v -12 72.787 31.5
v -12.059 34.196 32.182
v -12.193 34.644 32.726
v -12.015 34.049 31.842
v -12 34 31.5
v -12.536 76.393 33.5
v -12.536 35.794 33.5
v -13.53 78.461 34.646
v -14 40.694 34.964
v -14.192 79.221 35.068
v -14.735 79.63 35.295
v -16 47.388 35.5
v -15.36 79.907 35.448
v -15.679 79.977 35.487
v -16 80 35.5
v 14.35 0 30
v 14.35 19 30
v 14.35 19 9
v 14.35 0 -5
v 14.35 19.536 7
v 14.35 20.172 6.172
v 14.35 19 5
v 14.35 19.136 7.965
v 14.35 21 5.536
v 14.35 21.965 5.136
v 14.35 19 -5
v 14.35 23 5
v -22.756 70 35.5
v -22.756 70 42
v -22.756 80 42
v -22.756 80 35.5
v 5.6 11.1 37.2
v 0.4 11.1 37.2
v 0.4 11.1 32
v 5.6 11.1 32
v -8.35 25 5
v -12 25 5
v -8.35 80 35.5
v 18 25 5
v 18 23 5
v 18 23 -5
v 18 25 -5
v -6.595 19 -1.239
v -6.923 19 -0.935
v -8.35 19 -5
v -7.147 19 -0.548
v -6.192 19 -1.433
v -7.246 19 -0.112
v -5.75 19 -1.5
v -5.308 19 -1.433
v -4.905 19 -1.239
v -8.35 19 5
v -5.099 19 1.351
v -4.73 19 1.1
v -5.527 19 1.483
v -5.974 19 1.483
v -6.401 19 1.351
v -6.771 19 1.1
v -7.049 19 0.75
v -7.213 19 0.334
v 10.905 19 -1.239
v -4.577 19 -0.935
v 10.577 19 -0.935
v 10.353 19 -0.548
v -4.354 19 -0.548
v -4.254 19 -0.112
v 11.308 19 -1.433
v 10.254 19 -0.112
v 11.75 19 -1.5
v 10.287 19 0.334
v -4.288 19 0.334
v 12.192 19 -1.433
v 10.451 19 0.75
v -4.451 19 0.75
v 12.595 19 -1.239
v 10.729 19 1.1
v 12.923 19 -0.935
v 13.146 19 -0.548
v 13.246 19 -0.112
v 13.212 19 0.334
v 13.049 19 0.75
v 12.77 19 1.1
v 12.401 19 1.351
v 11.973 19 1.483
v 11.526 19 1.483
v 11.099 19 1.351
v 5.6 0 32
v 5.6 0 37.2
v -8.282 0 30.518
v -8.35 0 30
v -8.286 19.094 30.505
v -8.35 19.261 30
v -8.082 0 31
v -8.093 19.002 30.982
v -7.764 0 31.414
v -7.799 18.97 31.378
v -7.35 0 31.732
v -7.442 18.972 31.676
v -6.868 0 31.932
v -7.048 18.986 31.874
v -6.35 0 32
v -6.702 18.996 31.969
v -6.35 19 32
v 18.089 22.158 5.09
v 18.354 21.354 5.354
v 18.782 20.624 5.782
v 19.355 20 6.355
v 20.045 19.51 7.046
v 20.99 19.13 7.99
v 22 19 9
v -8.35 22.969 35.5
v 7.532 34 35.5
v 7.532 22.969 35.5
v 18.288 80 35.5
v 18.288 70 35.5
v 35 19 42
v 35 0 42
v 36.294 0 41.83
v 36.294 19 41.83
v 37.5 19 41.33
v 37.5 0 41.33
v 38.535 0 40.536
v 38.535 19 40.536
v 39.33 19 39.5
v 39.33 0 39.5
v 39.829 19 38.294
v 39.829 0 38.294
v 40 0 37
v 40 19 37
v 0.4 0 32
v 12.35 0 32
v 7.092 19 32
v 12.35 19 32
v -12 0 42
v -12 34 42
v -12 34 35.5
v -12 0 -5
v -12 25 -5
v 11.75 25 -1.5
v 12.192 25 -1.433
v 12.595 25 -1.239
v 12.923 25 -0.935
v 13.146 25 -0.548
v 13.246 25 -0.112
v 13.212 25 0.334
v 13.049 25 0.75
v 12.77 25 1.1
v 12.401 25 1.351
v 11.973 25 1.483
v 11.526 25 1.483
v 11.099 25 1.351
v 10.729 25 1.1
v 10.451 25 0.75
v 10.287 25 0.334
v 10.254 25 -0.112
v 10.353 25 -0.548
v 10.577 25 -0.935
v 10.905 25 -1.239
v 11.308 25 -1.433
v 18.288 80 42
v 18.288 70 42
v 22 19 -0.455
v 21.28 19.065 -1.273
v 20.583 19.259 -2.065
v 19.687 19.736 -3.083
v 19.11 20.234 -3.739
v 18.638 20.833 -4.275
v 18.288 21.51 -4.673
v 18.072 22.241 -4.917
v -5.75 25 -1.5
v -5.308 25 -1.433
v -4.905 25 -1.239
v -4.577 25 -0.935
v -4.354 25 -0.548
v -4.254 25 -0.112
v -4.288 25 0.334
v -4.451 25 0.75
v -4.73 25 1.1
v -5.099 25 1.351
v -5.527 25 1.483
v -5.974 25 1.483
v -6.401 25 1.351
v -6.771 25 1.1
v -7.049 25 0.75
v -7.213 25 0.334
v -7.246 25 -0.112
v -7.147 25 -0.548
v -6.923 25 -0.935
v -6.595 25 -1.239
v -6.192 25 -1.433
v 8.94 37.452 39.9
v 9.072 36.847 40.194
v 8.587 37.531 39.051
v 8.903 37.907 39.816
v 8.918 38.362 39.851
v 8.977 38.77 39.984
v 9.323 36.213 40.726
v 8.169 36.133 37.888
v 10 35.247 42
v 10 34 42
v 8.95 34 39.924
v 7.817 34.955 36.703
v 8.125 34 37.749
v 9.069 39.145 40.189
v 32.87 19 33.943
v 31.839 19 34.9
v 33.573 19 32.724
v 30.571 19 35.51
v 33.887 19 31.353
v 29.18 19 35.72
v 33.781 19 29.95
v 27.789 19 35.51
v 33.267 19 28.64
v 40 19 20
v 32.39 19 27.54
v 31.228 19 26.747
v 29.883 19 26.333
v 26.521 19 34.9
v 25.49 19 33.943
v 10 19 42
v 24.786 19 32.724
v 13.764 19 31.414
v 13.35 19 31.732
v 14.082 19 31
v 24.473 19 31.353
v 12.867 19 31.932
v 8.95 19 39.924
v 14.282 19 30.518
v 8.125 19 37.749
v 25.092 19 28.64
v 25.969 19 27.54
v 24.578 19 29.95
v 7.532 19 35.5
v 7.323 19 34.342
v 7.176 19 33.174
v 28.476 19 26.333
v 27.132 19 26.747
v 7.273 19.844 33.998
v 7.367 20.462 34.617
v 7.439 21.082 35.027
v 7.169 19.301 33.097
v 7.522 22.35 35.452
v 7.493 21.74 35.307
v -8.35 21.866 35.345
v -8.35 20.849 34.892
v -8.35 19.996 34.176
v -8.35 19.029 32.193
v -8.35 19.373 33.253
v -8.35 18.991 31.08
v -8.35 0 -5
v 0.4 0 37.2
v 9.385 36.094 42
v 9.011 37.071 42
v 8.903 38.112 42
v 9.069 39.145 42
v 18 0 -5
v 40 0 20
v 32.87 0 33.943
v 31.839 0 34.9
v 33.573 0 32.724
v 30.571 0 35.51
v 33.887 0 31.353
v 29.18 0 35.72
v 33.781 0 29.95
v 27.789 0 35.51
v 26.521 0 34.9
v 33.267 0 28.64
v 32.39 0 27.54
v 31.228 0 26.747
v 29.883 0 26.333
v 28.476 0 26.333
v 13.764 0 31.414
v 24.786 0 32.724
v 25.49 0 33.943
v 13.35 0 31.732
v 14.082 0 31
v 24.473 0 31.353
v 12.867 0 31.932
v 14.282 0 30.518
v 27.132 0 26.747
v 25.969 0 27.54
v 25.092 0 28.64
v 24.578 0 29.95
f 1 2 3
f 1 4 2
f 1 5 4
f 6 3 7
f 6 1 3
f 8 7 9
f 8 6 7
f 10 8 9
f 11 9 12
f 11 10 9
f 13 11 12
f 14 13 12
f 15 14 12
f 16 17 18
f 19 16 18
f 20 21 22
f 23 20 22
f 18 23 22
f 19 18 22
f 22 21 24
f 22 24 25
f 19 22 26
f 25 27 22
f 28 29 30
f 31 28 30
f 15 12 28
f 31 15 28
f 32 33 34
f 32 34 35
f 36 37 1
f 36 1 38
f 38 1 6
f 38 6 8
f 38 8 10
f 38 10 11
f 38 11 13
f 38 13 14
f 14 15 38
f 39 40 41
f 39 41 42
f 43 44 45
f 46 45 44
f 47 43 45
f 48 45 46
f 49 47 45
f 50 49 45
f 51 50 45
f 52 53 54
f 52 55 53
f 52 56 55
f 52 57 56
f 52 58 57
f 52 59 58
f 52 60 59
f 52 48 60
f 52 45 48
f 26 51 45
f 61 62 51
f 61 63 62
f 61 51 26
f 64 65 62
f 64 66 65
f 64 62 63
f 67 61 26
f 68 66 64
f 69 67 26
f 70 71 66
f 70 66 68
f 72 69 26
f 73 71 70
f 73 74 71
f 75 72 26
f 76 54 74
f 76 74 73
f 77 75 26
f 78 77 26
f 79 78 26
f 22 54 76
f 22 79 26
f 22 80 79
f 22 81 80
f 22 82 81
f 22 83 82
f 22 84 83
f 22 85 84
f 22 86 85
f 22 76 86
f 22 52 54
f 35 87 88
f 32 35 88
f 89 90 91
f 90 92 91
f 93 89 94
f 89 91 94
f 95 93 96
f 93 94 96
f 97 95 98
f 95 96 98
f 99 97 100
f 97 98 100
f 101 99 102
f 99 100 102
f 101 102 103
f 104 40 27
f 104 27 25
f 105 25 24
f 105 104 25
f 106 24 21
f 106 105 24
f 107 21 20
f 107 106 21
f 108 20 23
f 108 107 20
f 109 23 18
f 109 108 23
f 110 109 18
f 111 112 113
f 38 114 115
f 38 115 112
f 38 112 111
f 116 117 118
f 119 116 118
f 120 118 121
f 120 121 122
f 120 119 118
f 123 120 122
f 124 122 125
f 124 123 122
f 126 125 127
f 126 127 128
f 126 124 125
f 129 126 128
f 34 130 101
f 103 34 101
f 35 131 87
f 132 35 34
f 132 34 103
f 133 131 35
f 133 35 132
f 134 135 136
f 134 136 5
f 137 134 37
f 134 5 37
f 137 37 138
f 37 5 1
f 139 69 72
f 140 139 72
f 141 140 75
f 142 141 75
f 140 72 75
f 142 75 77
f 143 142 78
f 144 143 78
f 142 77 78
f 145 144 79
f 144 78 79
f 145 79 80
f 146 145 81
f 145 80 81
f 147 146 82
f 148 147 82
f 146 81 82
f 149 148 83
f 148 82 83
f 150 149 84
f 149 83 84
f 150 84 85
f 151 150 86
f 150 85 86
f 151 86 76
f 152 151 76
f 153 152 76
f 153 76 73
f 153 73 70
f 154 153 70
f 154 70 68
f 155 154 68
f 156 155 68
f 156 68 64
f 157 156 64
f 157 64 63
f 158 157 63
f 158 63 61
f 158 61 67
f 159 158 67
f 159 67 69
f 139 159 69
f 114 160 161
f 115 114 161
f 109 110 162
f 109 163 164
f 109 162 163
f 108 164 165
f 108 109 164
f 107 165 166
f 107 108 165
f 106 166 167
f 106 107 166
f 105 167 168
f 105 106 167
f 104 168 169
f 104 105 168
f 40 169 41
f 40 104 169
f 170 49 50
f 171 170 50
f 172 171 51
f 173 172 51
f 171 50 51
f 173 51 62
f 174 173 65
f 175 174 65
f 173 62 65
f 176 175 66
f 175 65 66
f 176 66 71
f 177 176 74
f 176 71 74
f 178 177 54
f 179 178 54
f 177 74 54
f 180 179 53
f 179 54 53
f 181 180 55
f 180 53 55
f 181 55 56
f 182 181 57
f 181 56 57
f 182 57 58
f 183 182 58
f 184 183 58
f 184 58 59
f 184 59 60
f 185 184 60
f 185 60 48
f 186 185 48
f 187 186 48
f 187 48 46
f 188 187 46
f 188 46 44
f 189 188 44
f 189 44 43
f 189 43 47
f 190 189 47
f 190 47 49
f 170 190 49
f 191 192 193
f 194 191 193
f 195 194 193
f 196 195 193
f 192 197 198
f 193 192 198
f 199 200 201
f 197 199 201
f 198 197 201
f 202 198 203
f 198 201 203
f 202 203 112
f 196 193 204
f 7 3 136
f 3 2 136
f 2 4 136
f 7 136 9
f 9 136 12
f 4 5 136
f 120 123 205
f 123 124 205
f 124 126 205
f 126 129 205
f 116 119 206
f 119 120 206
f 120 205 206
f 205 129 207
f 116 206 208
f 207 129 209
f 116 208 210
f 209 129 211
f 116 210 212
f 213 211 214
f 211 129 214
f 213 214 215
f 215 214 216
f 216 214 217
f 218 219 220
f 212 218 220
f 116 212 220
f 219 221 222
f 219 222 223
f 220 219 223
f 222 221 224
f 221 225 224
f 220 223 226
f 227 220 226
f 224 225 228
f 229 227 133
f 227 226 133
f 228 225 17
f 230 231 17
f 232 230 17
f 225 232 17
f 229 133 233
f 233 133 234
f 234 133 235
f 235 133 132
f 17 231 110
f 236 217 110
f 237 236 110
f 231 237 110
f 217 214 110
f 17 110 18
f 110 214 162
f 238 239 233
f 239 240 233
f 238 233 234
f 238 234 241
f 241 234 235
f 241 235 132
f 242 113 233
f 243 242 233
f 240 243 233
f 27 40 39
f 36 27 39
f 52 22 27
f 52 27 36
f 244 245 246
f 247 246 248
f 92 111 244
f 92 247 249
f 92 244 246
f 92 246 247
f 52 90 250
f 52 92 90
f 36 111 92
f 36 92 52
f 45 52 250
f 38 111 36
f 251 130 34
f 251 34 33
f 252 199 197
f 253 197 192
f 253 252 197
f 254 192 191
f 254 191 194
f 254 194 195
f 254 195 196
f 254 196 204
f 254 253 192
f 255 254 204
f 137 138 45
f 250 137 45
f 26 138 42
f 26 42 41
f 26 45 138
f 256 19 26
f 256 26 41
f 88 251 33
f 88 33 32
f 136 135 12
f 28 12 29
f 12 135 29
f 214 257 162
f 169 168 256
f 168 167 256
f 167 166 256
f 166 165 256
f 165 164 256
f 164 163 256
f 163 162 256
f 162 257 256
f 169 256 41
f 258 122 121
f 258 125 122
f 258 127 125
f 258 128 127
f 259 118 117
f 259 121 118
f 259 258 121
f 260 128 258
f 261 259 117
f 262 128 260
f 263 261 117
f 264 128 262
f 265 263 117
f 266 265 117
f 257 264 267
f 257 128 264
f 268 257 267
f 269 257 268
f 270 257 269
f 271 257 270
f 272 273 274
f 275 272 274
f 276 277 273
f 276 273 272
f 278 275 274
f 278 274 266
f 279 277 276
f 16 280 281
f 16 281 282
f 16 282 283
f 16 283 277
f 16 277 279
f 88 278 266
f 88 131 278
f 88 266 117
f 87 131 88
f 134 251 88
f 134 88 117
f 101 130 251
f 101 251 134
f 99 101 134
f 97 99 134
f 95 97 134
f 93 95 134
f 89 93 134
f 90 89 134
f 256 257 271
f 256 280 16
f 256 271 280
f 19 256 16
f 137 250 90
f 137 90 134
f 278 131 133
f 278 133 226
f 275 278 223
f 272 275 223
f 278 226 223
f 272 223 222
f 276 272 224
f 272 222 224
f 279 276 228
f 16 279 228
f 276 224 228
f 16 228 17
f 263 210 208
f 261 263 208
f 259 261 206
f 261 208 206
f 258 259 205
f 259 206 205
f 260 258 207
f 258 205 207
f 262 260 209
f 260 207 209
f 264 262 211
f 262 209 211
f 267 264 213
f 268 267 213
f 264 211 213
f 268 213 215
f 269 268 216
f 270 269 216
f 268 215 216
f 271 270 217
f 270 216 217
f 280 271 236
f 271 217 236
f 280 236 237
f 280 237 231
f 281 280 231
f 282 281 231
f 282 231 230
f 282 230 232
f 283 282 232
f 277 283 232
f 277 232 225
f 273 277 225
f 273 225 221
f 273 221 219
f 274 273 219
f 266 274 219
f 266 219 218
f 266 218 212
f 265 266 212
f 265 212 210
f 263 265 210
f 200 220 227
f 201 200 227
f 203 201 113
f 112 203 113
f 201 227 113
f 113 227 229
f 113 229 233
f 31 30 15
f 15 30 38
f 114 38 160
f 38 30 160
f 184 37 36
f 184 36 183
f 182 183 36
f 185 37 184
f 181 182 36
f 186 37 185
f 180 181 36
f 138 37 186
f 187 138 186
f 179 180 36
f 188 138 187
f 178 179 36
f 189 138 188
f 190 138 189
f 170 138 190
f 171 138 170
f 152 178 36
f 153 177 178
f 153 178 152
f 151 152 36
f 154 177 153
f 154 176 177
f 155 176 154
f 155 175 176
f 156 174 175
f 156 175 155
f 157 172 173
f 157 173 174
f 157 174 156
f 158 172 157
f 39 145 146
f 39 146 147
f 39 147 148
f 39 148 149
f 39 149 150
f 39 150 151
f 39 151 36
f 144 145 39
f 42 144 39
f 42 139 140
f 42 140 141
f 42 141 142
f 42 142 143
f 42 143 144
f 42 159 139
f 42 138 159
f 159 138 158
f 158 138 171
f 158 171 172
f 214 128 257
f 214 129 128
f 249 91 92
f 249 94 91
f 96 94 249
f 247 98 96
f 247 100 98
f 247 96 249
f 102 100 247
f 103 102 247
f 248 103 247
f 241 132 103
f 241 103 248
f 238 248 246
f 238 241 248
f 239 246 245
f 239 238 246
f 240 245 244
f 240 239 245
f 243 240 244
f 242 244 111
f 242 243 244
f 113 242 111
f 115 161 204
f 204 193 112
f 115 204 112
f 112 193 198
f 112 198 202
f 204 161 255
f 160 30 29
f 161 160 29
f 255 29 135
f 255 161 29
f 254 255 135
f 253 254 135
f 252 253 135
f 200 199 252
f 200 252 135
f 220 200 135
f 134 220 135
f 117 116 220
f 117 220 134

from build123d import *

# Parameters (mm, degrees)
SKETCH2_W            = 30
SKETCH2_H            = 10
BOSS_EXTRUDE1_DEPTH  = 25
SKETCH3_W            = 22.7
SKETCH3_H            = 19
CUT_EXTRUDE1_DEPTH   = 33.388133727
SKETCH4_R            = 1.5
CUT_EXTRUDE2_DEPTH   = 32.208832184
SKETCH5_W            = 3.65
SKETCH5_H            = 19
BOSS_EXTRUDE2_DEPTH  = 37
SKETCH6_W            = 3.65
SKETCH6_H            = 19
BOSS_EXTRUDE3_DEPTH  = 37
SKETCH11_W           = 10
SKETCH11_H           = 19
BOSS_EXTRUDE7_DEPTH  = 22.7
SKETCH12_W           = 5.2
SKETCH12_H           = 5.2
CUT_EXTRUDE4_DEPTH   = 11.1
SKETCH14_W           = 22
SKETCH14_H           = 19
BOSS_EXTRUDE8_DEPTH  = 22
SKETCH15_R           = 4.72
CUT_EXTRUDE6_DEPTH   = 62.032617987
BOSS_EXTRUDE9_DEPTH  = 15
BOSS_EXTRUDE11_DEPTH = 19
BOSS_EXTRUDE12_DEPTH = 6.5
BOSS_EXTRUDE13_DEPTH = 3.65
FILLET1_R            = 5
FILLET2_R            = 4
FILLET3_R            = 2
FILLET5_R            = 4


with BuildPart() as part:
    # Sketch2 → Boss-Extrude1 (new body)
    with BuildSketch(Plane(origin=(0, 0, 0), x_dir=(1, 0, 0), z_dir=(0, 1, 0))):
        with Locations((2.999755729, 0)):
            Rectangle(SKETCH2_W, SKETCH2_H)
    extrude(amount=BOSS_EXTRUDE1_DEPTH)

    # Sketch3 → Cut-Extrude1 (cut, through all)
    with BuildSketch(Plane.XY.offset(5)):
        with Locations((2.999755729, 9.5)):
            Rectangle(SKETCH3_W, SKETCH3_H)
    extrude(amount=-CUT_EXTRUDE1_DEPTH, mode=Mode.SUBTRACT)

    # Sketch4 → Cut-Extrude2 (cut, through all)
    with BuildSketch(Plane.XZ):
        with Locations(Location((-5.750244271, 0, 0), (0, 0, 270))):
            Circle(SKETCH4_R)
        with Locations(Location((11.749755729, 0, 0), (0, 0, 270))):
            Circle(SKETCH4_R)
    extrude(amount=-CUT_EXTRUDE2_DEPTH, mode=Mode.SUBTRACT)

    # Sketch5 → Boss-Extrude2 (add)
    with BuildSketch(Plane.XY.offset(5)):
        with Locations((16.174755729, 9.5)):
            Rectangle(SKETCH5_W, SKETCH5_H)
    extrude(amount=BOSS_EXTRUDE2_DEPTH)

    # Sketch6 → Boss-Extrude3 (add)
    with BuildSketch(Plane.XY.offset(5)):
        with Locations((-10.175244271, 9.5)):
            Rectangle(SKETCH6_W, SKETCH6_H)
    extrude(amount=BOSS_EXTRUDE3_DEPTH)

    # Sketch11 → Boss-Extrude7 (add)
    with BuildSketch(Plane.ZY.offset(-14.349755729)):
        with Locations((37, 9.5)):
            Rectangle(SKETCH11_W, SKETCH11_H)
    extrude(amount=BOSS_EXTRUDE7_DEPTH)

    # Sketch12 → Cut-Extrude4 (cut)
    with BuildSketch(Plane.XZ):
        with Locations((2.999755729, 34.6)):
            Rectangle(SKETCH12_W, SKETCH12_H)
    extrude(amount=-CUT_EXTRUDE4_DEPTH, mode=Mode.SUBTRACT)

    # Sketch14 → Boss-Extrude8 (add)
    with BuildSketch(Plane(origin=(17.999755729, 0, 0), x_dir=(0, 0, -1), z_dir=(1, 0, 0))):
        with Locations((-31, 9.5)):
            Rectangle(SKETCH14_W, SKETCH14_H)
    extrude(amount=BOSS_EXTRUDE8_DEPTH)

    # Sketch15 → Cut-Extrude6 (cut, through all)
    with BuildSketch(Plane(origin=(0, 19, 0), x_dir=(1, 0, 0), z_dir=(0, 1, 0))):
        with Locations(Location((29.179755729, -31, 0), (0, 0, 270))):
            Circle(SKETCH15_R)
    extrude(amount=-CUT_EXTRUDE6_DEPTH, mode=Mode.SUBTRACT)

    # Sketch16 → Boss-Extrude9 (add)
    with BuildSketch(Plane(origin=(0, 19, 0), x_dir=(1, 0, 0), z_dir=(0, 1, 0))):
        with BuildLine():
            Line((-12.000244271, -42), (9.999755729, -42))
            ThreePointArc((9.999755729, -42), (8.508821331, -38.847602891), (7.532067631, -35.5))
            Line((7.532067631, -35.5), (-12.000244271, -35.5))
            Line((-12.000244271, -35.5), (-12.000244271, -42))
        make_face()
    extrude(amount=BOSS_EXTRUDE9_DEPTH)

    # Sketch18 → Boss-Extrude11 (add)
    with BuildSketch(Plane(origin=(0, 19, 0), x_dir=(1, 0, 0), z_dir=(0, 1, 0))):
        Polygon((17.999755729, -20), (17.999755729, 5), (39.999755729, -20), align=None)
    extrude(amount=-BOSS_EXTRUDE11_DEPTH)

    # Sketch19 → Boss-Extrude12 (add)
    with BuildSketch(Plane.XY.offset(42)):
        Polygon((-22.755932023, 80), (18.287755383, 80), (18.287755383, 70), (7.532067631, 34), (-12.000244271, 34), (-22.755932023, 70), align=None)
    extrude(amount=-BOSS_EXTRUDE12_DEPTH)

    # Sketch20 → Boss-Extrude13 (add)
    with BuildSketch(Plane.ZY.offset(12.000244271)):
        Polygon((5, 25), (35.5, 80), (35.5, 19), (5, 19), align=None)
    extrude(amount=-BOSS_EXTRUDE13_DEPTH)

    # Fillet1
    fillet1_edges = [part.edges().sort_by_distance(p)[0] for p in [
        (39.999755729, 9.5, 42),
    ]]
    fillet(fillet1_edges, radius=FILLET1_R)

    # Fillet2
    # the kernel refuses this fillet: 4 mm, written as the material it adds along each edge
    with BuildSketch(Plane(origin=(17.999755729, 19, 5), x_dir=(1, 0, 0), z_dir=(0, 0, -1))) as fillet2_piece_1_section:
        with BuildLine():
            CenterArc((FILLET2_R, -FILLET2_R), FILLET2_R, 90, 90)
            Line((0, -FILLET2_R), (0, 0))
            Line((0, 0), (FILLET2_R, 0))
        make_face()
    fillet2_piece_1 = extrude(amount=20, mode=Mode.PRIVATE)
    fillet2_piece_1 = split(fillet2_piece_1, bisect_by=Plane(origin=(22.959178632, 19, 0.635707845), z_dir=(-0.7507135169227555, 0, 0.6606278948920247)), keep=Keep.TOP, mode=Mode.PRIVATE)
    add(fillet2_piece_1)
    with BuildSketch(Plane(origin=(-12.000244271, 90, 35.5), x_dir=(0, 0, -1), z_dir=(0, -1, 0))) as fillet2_piece_2_section:
        with BuildLine():
            CenterArc((FILLET2_R, -FILLET2_R), FILLET2_R, 90, 90)
            Line((0, -FILLET2_R), (0, 0))
            Line((0, 0), (FILLET2_R, 0))
        make_face()
    fillet2_piece_2 = extrude(amount=66, mode=Mode.PRIVATE)
    fillet2_piece_2 = split(fillet2_piece_2, bisect_by=Plane(origin=(-27.36023555, 85.410909165, 35.5), z_dir=(0.9581502749407442, 0.2862656993615832, 0)), keep=Keep.TOP, mode=Mode.PRIVATE)
    fillet2_piece_2 = split(fillet2_piece_2, bisect_by=Plane(origin=(-12.000244271, 87.648062701, 39.741198407), z_dir=(0, -0.48496776166331645, 0.8745320292289315)), keep=Keep.TOP, mode=Mode.PRIVATE)
    add(fillet2_piece_2)
    with BuildSketch(Plane(origin=(17.999755729, 19, 5), x_dir=(0, 0, 1), z_dir=(-1, 0, 0))) as fillet2_piece_3:
        with BuildLine():
            CenterArc((FILLET2_R, FILLET2_R), FILLET2_R, 180, 90)
            Line((0, FILLET2_R), (0, 0))
            Line((0, 0), (FILLET2_R, 0))
        make_face()
    extrude(amount=3.65)
    with BuildSketch(Plane(origin=(17.453635047, 19, 35.5), x_dir=(0, 0, -1), z_dir=(-1, 0, 0))) as fillet2_piece_4_section:
        with BuildLine():
            CenterArc((4, -3.968626967), FILLET2_R, 97.180755781, 82.819244219)
            Line((0, -3.968626967), (0, 0))
            Line((0, 0), (3.5, 0))
        make_face()
    fillet2_piece_4 = extrude(amount=35.725446735, mode=Mode.PRIVATE)
    fillet2_piece_4 = fillet2_piece_4 - Plane(origin=(29.179755729, 19, 31), x_dir=(-0.8674627670502353, 0, 0.49750210831869773), z_dir=(0, -1, 0)) * Cylinder(22.110459064, 88, mode=Mode.PRIVATE)
    fillet2_piece_4 = split(fillet2_piece_4, bisect_by=Plane(origin=(-12.000244271, 19, 35.5), z_dir=(1, 0, 0)), keep=Keep.TOP, mode=Mode.PRIVATE)
    add(fillet2_piece_4)
    with BuildSketch(Plane(origin=(17.999755729, 19, 15), x_dir=(1, 0, 0), z_dir=(0, 0, -1))) as fillet2_piece_5a_section:
        with BuildLine():
            CenterArc((FILLET2_R, -FILLET2_R), FILLET2_R, 90, 90)
            Line((0, -FILLET2_R), (0, 0))
            Line((0, 0), (FILLET2_R, 0))
        make_face()
    fillet2_piece_5a = extrude(amount=20, mode=Mode.PRIVATE)
    fillet2_piece_5a = split(fillet2_piece_5a, bisect_by=Plane(origin=(17.999755729, 19, 5), z_dir=(0, 0, 1)), keep=Keep.TOP, mode=Mode.PRIVATE)
    with BuildSketch(Plane(origin=(27.999755729, 19, 5), x_dir=(0, 0, 1), z_dir=(-1, 0, 0))) as fillet2_piece_5b_section:
        with BuildLine():
            CenterArc((FILLET2_R, FILLET2_R), FILLET2_R, 180, 90)
            Line((0, FILLET2_R), (0, 0))
            Line((0, 0), (FILLET2_R, 0))
        make_face()
    fillet2_piece_5b = extrude(amount=13.65, mode=Mode.PRIVATE)
    fillet2_piece_5b = split(fillet2_piece_5b, bisect_by=Plane(origin=(27.323470787, 19, 5.595130748), z_dir=(-0.7507135169227555, 0, 0.6606278948920247)), keep=Keep.TOP, mode=Mode.PRIVATE)
    fillet2_piece_5b = split(fillet2_piece_5b, bisect_by=Plane(origin=(17.999755729, 19, 5), z_dir=(1, 0, 0)), keep=Keep.TOP, mode=Mode.PRIVATE)
    fillet2_piece_5 = fillet2_piece_5a & fillet2_piece_5b
    add(fillet2_piece_5)

    # Fillet3
    fillet3_edges = [part.edges().sort_by_distance(p)[0] for p in [
        (14.349755729, 9.5, 32),
        (-8.350244271, 9.5, 32),
    ]]
    fillet(fillet3_edges, radius=FILLET3_R)

    # Fillet5
    # the kernel refuses this fillet: 4 mm, written as the material it adds along each edge
    with BuildSketch(Plane(origin=(7.532067631, 34, 42), x_dir=(0.2862656993615828, 0.9581502749407443, 0), z_dir=(0, 0, -1))) as fillet5_piece_1_section:
        with BuildLine():
            CenterArc((FILLET5_R * 1.34244672574, FILLET5_R), FILLET5_R, 163.365479622, 106.634520378)
            Line((FILLET5_R * 0.3842964508, FILLET5_R * 1.28626569936), (0, 0))
            Line((0, 0), (FILLET5_R * 1.34244672574, 0))
        make_face()
    fillet5_piece_1 = extrude(amount=6.5, mode=Mode.PRIVATE)
    fillet5_piece_1 = fillet5_piece_1 - Plane(origin=(29.179755729, 34, 31), x_dir=(-0.8674627670500467, 0, 0.49750210831902675), z_dir=(0, -1, 0)) * Cylinder(22.110459064, 35, mode=Mode.PRIVATE)
    add(fillet5_piece_1)


solid = part.part
